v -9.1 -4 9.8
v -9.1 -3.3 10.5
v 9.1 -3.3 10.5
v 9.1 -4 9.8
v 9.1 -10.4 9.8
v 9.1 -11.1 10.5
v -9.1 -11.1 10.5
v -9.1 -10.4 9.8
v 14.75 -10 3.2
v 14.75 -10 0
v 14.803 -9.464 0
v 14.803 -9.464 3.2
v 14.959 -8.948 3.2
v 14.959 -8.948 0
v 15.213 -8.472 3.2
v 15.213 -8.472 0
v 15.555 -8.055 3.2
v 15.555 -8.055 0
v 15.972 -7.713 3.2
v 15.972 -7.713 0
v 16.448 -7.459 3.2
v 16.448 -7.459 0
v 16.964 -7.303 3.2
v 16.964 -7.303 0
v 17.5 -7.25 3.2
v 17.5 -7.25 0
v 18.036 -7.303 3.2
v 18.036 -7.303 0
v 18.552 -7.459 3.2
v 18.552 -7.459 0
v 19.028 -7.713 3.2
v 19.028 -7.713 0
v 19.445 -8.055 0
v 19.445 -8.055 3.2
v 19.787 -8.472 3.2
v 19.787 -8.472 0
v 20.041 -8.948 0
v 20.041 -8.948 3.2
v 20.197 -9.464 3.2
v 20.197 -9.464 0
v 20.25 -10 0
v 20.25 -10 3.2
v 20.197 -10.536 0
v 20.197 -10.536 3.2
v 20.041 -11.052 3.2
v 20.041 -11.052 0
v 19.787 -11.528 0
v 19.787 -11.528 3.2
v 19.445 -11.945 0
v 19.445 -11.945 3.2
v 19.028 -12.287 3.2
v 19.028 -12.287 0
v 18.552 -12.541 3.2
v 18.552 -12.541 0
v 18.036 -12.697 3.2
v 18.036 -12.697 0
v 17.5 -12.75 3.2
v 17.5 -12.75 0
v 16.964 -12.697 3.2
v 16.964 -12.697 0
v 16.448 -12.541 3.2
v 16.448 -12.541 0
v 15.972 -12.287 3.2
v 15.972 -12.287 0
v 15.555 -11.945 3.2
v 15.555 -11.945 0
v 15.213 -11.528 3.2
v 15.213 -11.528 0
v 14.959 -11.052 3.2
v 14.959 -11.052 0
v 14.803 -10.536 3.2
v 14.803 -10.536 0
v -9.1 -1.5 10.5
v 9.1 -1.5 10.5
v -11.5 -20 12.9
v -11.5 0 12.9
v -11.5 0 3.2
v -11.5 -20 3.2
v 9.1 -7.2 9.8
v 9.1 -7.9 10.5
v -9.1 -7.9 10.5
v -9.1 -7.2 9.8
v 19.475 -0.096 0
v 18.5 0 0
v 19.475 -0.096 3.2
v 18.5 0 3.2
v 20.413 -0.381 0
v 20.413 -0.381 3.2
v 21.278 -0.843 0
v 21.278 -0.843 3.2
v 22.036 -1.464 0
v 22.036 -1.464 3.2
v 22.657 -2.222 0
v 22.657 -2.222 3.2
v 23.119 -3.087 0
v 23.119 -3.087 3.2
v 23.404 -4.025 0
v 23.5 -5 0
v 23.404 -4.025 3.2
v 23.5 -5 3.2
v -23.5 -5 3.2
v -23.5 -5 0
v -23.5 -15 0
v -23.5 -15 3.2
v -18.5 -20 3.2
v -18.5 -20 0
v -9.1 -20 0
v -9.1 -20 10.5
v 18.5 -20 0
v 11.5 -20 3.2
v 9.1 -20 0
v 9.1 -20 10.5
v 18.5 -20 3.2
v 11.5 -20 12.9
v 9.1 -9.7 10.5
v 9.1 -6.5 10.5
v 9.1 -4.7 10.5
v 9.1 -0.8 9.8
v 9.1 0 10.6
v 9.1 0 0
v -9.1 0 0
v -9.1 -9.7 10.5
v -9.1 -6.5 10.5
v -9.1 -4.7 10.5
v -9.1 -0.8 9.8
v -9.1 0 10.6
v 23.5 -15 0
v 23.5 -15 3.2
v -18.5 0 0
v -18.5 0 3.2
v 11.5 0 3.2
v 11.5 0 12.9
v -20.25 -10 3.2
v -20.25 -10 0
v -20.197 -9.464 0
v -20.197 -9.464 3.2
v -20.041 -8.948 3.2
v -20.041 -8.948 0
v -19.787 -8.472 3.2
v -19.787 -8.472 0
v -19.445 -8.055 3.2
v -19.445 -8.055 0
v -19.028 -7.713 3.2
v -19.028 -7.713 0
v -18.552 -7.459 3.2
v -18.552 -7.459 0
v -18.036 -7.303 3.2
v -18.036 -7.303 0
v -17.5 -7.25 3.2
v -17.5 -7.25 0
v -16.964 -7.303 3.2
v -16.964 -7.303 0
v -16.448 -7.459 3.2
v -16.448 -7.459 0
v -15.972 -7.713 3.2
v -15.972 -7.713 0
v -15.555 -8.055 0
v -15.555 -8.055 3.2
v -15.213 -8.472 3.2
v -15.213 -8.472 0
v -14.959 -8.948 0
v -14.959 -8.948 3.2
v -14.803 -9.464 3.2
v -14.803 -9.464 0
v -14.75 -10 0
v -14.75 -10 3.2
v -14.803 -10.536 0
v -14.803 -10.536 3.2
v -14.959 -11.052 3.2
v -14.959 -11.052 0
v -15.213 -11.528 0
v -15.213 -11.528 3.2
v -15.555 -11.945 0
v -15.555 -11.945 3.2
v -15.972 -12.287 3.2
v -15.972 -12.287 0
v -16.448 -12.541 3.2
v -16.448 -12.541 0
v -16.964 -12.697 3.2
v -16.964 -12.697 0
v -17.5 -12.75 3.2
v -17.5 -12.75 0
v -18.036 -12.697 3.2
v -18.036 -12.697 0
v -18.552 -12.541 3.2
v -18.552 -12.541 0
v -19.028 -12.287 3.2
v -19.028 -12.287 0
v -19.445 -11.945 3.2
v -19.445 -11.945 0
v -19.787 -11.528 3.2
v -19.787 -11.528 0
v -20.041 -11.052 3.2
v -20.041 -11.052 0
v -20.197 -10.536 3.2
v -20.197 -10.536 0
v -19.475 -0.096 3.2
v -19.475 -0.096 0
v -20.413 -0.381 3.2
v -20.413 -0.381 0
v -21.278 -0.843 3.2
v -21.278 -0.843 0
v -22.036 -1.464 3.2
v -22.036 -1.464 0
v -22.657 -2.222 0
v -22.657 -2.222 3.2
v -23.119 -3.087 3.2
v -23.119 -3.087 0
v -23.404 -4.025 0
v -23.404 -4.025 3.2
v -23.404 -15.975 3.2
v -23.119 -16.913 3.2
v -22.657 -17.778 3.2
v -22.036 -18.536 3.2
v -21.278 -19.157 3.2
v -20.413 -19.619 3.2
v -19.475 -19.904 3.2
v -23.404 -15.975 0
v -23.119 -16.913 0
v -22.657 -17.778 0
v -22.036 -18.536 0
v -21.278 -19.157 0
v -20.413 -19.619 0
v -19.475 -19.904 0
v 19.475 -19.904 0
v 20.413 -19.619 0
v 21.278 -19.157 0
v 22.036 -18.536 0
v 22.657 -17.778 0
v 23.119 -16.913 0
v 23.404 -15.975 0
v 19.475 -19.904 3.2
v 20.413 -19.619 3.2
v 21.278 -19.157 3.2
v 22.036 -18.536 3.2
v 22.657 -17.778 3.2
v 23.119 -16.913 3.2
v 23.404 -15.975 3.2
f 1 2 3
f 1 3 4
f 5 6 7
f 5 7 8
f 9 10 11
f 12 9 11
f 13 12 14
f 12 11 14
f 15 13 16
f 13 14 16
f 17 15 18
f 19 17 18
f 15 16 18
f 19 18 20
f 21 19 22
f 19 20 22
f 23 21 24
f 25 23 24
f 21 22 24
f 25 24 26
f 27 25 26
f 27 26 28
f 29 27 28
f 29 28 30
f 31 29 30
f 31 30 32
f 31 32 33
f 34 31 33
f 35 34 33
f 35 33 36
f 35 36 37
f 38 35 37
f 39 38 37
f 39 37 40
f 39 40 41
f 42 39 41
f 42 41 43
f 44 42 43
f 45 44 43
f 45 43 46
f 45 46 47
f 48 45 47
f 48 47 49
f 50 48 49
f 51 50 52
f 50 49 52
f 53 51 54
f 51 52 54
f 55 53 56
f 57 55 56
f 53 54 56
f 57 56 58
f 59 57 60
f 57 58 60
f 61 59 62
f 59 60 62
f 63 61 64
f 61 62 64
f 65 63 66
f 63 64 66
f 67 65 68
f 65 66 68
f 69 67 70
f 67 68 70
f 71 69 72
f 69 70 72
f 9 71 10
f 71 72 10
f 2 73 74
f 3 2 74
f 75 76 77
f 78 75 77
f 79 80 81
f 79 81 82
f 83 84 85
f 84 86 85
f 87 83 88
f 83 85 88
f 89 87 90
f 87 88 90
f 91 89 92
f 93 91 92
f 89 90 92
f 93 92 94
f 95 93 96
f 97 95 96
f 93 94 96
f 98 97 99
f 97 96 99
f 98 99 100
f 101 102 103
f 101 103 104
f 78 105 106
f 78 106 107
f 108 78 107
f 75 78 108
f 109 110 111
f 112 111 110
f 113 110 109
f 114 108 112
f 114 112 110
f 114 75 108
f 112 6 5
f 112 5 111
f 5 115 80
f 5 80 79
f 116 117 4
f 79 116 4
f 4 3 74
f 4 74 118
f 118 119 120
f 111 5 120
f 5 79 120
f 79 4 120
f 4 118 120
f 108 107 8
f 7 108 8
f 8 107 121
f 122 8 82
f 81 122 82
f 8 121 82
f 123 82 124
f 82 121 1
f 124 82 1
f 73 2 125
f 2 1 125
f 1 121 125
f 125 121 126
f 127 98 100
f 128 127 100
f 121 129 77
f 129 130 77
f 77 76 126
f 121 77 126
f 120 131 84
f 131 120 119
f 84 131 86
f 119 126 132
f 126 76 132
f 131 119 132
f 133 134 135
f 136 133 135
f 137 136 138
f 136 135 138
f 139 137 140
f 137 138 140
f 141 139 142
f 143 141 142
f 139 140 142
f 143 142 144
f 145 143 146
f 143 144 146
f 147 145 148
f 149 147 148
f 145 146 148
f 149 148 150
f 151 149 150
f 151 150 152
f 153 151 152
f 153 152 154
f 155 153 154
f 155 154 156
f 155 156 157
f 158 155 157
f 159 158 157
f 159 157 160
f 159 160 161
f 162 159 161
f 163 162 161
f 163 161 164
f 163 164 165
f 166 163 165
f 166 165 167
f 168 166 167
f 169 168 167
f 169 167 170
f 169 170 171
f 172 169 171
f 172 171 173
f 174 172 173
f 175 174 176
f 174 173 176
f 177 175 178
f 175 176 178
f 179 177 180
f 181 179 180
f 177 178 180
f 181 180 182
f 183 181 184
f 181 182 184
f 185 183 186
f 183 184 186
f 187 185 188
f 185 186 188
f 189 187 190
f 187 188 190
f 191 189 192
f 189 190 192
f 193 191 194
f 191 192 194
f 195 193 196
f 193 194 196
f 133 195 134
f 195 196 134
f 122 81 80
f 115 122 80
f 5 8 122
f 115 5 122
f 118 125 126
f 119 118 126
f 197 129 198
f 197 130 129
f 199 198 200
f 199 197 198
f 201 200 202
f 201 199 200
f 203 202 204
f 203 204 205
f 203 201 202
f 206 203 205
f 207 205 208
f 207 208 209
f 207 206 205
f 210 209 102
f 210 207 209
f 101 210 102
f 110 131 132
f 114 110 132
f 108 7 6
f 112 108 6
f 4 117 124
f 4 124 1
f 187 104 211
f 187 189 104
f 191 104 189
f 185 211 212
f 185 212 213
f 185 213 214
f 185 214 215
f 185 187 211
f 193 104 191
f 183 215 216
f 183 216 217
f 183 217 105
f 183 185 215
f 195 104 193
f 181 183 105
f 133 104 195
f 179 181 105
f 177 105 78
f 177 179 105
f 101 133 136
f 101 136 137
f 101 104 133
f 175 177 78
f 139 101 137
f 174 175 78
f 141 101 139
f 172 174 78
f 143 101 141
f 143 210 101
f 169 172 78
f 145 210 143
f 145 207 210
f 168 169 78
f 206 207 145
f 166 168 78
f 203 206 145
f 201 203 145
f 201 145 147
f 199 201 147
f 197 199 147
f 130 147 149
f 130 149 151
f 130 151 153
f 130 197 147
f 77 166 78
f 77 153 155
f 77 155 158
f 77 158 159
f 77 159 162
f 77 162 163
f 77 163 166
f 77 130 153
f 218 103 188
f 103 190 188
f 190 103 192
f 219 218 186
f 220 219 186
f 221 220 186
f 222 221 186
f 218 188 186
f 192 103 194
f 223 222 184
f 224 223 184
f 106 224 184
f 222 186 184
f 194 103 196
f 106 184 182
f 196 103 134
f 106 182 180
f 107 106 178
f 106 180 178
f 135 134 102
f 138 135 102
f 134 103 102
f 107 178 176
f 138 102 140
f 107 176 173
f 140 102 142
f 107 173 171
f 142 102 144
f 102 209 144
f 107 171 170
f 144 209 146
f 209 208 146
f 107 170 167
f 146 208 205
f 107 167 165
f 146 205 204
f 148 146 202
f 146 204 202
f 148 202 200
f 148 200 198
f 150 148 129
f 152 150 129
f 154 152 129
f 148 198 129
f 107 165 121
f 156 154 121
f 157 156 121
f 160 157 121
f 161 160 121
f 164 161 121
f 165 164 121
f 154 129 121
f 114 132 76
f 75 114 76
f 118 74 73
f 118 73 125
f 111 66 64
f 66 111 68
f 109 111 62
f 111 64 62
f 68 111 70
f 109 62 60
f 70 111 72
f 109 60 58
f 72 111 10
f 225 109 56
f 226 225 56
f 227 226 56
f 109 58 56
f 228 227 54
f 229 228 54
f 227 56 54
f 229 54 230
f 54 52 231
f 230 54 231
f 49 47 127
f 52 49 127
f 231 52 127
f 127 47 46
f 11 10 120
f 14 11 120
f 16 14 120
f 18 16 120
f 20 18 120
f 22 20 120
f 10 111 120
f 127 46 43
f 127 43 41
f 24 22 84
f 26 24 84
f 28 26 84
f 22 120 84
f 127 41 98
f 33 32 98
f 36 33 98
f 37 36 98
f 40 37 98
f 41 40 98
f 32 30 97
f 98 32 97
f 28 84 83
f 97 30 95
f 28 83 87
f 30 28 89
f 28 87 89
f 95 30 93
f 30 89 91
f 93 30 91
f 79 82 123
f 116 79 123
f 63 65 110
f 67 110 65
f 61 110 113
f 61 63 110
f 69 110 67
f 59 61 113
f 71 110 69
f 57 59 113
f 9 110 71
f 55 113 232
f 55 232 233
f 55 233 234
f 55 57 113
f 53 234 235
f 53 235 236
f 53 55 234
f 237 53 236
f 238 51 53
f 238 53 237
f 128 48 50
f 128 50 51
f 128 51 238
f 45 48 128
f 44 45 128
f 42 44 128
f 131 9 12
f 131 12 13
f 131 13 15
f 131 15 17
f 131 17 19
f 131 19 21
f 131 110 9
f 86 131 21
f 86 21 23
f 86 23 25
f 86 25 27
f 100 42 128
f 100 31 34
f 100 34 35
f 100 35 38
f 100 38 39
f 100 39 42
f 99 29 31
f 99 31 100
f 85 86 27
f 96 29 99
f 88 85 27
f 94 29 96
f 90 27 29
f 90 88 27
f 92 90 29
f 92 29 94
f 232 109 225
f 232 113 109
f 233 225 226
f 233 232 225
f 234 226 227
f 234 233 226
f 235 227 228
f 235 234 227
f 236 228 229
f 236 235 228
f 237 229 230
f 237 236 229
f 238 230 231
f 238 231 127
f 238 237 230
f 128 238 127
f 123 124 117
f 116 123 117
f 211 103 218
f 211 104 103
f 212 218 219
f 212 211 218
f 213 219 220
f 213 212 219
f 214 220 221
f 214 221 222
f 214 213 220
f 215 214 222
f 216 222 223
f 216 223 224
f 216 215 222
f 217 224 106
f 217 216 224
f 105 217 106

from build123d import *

# Parameters (mm, degrees)
F0_W         = 12
F0_H         = 3.2
F1_DEPTH     = 20
F3_D         = 5.5
F4_W         = 18.2
F4_H         = 1.6
F5_DEPTH     = 0.9
F6_T1_DEPTH  = 18.2
F6_T6_DEPTH  = 18.2
F6_T11_DEPTH = 18.2
F6_T16_DEPTH = 18.2
F6_T21_DEPTH = 18.2
F6_T26_DEPTH = 18.2
F6_T31_DEPTH = 18.2
F6_T36_DEPTH = 18.2
F7_R         = 5


# Not quite as in the source:
# - a fillet or chamfer that OpenCascade refuses, or shapes differently, is made with other operations: its cross-section is extruded or revolved along the edge and cut away or added


with BuildPart() as f1:
    # F0 (on Front) → F1 (new body)
    with BuildSketch(Plane.XZ):
        Polygon((-9.1, 10.5), (0, 10.5), (0, 12.9), (-11.5, 12.9), (-11.5, 3.2), (-11.5, 0), (-9.1, 0), align=None)
        with Locations((-17.5, 1.6)):
            Rectangle(F0_W, F0_H)
        Polygon((0, 12.9), (0, 10.5), (9.1, 10.5), (9.1, 0), (11.5, 0), (11.5, 3.2), (11.5, 12.9), align=None)
        with Locations((17.5, 1.6)):
            Rectangle(F0_W, F0_H)
    extrude(amount=F1_DEPTH)

    # F3 (through all)
    with Locations(Plane.XY.offset(3.2)):
        with Locations((-17.5, -10), (17.5, -10)):
            Hole(F3_D / 2)

    # F4 (on face) → F5 (join)
    with BuildSketch(Plane(origin=(0, 0, 10.5), x_dir=(1, 0, 0), z_dir=(0, 0, -1))):
        with Locations((0, 0.8)):
            Rectangle(F4_W, F4_H)
        with Locations((0, 4)):
            Rectangle(F4_W, F4_H)
        with Locations((0, 7.2)):
            Rectangle(F4_W, F4_H)
        with Locations((0, 10.4)):
            Rectangle(F4_W, F4_H)
    extrude(amount=F5_DEPTH)

    # F6: chamfer of 1 on 8 edges, made by hand

    # F6_s2 → F6_t1 (cut)
    with BuildSketch(Plane.YZ.offset(-9.1)):
        Polygon((-1, 9.6), (0, 10.6), (0, 9.6), align=None)
    extrude(amount=F6_T1_DEPTH, mode=Mode.SUBTRACT)


with BuildPart() as f6_tool4:
    # F6_s5 → F6_t6 (new body)
    with BuildSketch(Plane.YZ.offset(9.1)):
        Polygon((-1.6, 10.6), (-0.6, 9.6), (-1.6, 9.6), align=None)
    extrude(amount=-F6_T6_DEPTH)

    split(bisect_by=Plane.XY.offset(10.5), keep=Keep.BOTTOM)


with BuildPart() as f1_1:
    add(f1.part)

    # F6_t3: cut F6_tool4
    add(f6_tool4.part, mode=Mode.SUBTRACT)


with BuildPart() as f6_tool9:
    # F6_s10 → F6_t11 (new body)
    with BuildSketch(Plane.YZ.offset(-9.1)):
        Polygon((-3.2, 10.6), (-4.2, 9.6), (-3.2, 9.6), align=None)
    extrude(amount=F6_T11_DEPTH)

    split(bisect_by=Plane.XY.offset(10.5), keep=Keep.BOTTOM)


with BuildPart() as f1_2:
    add(f1_1.part)

    # F6_t8: cut F6_tool9
    add(f6_tool9.part, mode=Mode.SUBTRACT)


with BuildPart() as f6_tool14:
    # F6_s15 → F6_t16 (new body)
    with BuildSketch(Plane.YZ.offset(9.1)):
        Polygon((-4.8, 10.6), (-3.8, 9.6), (-4.8, 9.6), align=None)
    extrude(amount=-F6_T16_DEPTH)

    split(bisect_by=Plane.XY.offset(10.5), keep=Keep.BOTTOM)


with BuildPart() as f1_3:
    add(f1_2.part)

    # F6_t13: cut F6_tool14
    add(f6_tool14.part, mode=Mode.SUBTRACT)


with BuildPart() as f6_tool19:
    # F6_s20 → F6_t21 (new body)
    with BuildSketch(Plane.YZ.offset(-9.1)):
        Polygon((-7.4, 9.6), (-6.4, 10.6), (-6.4, 9.6), align=None)
    extrude(amount=F6_T21_DEPTH)

    split(bisect_by=Plane.XY.offset(10.5), keep=Keep.BOTTOM)


with BuildPart() as f1_4:
    add(f1_3.part)

    # F6_t18: cut F6_tool19
    add(f6_tool19.part, mode=Mode.SUBTRACT)


with BuildPart() as f6_tool24:
    # F6_s25 → F6_t26 (new body)
    with BuildSketch(Plane.YZ.offset(9.1)):
        Polygon((-8, 10.6), (-7, 9.6), (-8, 9.6), align=None)
    extrude(amount=-F6_T26_DEPTH)

    split(bisect_by=Plane.XY.offset(10.5), keep=Keep.BOTTOM)


with BuildPart() as f1_5:
    add(f1_4.part)

    # F6_t23: cut F6_tool24
    add(f6_tool24.part, mode=Mode.SUBTRACT)


with BuildPart() as f6_tool29:
    # F6_s30 → F6_t31 (new body)
    with BuildSketch(Plane.YZ.offset(-9.1)):
        Polygon((-10.6, 9.6), (-9.6, 10.6), (-9.6, 9.6), align=None)
    extrude(amount=F6_T31_DEPTH)

    split(bisect_by=Plane.XY.offset(10.5), keep=Keep.BOTTOM)


with BuildPart() as f1_6:
    add(f1_5.part)

    # F6_t28: cut F6_tool29
    add(f6_tool29.part, mode=Mode.SUBTRACT)


with BuildPart() as f6_tool34:
    # F6_s35 → F6_t36 (new body)
    with BuildSketch(Plane.YZ.offset(9.1)):
        Polygon((-11.2, 10.6), (-10.2, 9.6), (-11.2, 9.6), align=None)
    extrude(amount=-F6_T36_DEPTH)

    split(bisect_by=Plane.XY.offset(10.5), keep=Keep.BOTTOM)


with BuildPart() as f1_7:
    add(f1_6.part)

    # F6_t33: cut F6_tool34
    add(f6_tool34.part, mode=Mode.SUBTRACT)

    # F7
    f7_edges = [f1_7.edges().sort_by_distance(p)[0] for p in [
        (-23.5, -20, 1.6),
        (23.5, -20, 1.6),
        (23.5, 0, 1.6),
        (-23.5, 0, 1.6),
    ]]
    fillet(f7_edges, radius=F7_R)


solid = f1_7.part
